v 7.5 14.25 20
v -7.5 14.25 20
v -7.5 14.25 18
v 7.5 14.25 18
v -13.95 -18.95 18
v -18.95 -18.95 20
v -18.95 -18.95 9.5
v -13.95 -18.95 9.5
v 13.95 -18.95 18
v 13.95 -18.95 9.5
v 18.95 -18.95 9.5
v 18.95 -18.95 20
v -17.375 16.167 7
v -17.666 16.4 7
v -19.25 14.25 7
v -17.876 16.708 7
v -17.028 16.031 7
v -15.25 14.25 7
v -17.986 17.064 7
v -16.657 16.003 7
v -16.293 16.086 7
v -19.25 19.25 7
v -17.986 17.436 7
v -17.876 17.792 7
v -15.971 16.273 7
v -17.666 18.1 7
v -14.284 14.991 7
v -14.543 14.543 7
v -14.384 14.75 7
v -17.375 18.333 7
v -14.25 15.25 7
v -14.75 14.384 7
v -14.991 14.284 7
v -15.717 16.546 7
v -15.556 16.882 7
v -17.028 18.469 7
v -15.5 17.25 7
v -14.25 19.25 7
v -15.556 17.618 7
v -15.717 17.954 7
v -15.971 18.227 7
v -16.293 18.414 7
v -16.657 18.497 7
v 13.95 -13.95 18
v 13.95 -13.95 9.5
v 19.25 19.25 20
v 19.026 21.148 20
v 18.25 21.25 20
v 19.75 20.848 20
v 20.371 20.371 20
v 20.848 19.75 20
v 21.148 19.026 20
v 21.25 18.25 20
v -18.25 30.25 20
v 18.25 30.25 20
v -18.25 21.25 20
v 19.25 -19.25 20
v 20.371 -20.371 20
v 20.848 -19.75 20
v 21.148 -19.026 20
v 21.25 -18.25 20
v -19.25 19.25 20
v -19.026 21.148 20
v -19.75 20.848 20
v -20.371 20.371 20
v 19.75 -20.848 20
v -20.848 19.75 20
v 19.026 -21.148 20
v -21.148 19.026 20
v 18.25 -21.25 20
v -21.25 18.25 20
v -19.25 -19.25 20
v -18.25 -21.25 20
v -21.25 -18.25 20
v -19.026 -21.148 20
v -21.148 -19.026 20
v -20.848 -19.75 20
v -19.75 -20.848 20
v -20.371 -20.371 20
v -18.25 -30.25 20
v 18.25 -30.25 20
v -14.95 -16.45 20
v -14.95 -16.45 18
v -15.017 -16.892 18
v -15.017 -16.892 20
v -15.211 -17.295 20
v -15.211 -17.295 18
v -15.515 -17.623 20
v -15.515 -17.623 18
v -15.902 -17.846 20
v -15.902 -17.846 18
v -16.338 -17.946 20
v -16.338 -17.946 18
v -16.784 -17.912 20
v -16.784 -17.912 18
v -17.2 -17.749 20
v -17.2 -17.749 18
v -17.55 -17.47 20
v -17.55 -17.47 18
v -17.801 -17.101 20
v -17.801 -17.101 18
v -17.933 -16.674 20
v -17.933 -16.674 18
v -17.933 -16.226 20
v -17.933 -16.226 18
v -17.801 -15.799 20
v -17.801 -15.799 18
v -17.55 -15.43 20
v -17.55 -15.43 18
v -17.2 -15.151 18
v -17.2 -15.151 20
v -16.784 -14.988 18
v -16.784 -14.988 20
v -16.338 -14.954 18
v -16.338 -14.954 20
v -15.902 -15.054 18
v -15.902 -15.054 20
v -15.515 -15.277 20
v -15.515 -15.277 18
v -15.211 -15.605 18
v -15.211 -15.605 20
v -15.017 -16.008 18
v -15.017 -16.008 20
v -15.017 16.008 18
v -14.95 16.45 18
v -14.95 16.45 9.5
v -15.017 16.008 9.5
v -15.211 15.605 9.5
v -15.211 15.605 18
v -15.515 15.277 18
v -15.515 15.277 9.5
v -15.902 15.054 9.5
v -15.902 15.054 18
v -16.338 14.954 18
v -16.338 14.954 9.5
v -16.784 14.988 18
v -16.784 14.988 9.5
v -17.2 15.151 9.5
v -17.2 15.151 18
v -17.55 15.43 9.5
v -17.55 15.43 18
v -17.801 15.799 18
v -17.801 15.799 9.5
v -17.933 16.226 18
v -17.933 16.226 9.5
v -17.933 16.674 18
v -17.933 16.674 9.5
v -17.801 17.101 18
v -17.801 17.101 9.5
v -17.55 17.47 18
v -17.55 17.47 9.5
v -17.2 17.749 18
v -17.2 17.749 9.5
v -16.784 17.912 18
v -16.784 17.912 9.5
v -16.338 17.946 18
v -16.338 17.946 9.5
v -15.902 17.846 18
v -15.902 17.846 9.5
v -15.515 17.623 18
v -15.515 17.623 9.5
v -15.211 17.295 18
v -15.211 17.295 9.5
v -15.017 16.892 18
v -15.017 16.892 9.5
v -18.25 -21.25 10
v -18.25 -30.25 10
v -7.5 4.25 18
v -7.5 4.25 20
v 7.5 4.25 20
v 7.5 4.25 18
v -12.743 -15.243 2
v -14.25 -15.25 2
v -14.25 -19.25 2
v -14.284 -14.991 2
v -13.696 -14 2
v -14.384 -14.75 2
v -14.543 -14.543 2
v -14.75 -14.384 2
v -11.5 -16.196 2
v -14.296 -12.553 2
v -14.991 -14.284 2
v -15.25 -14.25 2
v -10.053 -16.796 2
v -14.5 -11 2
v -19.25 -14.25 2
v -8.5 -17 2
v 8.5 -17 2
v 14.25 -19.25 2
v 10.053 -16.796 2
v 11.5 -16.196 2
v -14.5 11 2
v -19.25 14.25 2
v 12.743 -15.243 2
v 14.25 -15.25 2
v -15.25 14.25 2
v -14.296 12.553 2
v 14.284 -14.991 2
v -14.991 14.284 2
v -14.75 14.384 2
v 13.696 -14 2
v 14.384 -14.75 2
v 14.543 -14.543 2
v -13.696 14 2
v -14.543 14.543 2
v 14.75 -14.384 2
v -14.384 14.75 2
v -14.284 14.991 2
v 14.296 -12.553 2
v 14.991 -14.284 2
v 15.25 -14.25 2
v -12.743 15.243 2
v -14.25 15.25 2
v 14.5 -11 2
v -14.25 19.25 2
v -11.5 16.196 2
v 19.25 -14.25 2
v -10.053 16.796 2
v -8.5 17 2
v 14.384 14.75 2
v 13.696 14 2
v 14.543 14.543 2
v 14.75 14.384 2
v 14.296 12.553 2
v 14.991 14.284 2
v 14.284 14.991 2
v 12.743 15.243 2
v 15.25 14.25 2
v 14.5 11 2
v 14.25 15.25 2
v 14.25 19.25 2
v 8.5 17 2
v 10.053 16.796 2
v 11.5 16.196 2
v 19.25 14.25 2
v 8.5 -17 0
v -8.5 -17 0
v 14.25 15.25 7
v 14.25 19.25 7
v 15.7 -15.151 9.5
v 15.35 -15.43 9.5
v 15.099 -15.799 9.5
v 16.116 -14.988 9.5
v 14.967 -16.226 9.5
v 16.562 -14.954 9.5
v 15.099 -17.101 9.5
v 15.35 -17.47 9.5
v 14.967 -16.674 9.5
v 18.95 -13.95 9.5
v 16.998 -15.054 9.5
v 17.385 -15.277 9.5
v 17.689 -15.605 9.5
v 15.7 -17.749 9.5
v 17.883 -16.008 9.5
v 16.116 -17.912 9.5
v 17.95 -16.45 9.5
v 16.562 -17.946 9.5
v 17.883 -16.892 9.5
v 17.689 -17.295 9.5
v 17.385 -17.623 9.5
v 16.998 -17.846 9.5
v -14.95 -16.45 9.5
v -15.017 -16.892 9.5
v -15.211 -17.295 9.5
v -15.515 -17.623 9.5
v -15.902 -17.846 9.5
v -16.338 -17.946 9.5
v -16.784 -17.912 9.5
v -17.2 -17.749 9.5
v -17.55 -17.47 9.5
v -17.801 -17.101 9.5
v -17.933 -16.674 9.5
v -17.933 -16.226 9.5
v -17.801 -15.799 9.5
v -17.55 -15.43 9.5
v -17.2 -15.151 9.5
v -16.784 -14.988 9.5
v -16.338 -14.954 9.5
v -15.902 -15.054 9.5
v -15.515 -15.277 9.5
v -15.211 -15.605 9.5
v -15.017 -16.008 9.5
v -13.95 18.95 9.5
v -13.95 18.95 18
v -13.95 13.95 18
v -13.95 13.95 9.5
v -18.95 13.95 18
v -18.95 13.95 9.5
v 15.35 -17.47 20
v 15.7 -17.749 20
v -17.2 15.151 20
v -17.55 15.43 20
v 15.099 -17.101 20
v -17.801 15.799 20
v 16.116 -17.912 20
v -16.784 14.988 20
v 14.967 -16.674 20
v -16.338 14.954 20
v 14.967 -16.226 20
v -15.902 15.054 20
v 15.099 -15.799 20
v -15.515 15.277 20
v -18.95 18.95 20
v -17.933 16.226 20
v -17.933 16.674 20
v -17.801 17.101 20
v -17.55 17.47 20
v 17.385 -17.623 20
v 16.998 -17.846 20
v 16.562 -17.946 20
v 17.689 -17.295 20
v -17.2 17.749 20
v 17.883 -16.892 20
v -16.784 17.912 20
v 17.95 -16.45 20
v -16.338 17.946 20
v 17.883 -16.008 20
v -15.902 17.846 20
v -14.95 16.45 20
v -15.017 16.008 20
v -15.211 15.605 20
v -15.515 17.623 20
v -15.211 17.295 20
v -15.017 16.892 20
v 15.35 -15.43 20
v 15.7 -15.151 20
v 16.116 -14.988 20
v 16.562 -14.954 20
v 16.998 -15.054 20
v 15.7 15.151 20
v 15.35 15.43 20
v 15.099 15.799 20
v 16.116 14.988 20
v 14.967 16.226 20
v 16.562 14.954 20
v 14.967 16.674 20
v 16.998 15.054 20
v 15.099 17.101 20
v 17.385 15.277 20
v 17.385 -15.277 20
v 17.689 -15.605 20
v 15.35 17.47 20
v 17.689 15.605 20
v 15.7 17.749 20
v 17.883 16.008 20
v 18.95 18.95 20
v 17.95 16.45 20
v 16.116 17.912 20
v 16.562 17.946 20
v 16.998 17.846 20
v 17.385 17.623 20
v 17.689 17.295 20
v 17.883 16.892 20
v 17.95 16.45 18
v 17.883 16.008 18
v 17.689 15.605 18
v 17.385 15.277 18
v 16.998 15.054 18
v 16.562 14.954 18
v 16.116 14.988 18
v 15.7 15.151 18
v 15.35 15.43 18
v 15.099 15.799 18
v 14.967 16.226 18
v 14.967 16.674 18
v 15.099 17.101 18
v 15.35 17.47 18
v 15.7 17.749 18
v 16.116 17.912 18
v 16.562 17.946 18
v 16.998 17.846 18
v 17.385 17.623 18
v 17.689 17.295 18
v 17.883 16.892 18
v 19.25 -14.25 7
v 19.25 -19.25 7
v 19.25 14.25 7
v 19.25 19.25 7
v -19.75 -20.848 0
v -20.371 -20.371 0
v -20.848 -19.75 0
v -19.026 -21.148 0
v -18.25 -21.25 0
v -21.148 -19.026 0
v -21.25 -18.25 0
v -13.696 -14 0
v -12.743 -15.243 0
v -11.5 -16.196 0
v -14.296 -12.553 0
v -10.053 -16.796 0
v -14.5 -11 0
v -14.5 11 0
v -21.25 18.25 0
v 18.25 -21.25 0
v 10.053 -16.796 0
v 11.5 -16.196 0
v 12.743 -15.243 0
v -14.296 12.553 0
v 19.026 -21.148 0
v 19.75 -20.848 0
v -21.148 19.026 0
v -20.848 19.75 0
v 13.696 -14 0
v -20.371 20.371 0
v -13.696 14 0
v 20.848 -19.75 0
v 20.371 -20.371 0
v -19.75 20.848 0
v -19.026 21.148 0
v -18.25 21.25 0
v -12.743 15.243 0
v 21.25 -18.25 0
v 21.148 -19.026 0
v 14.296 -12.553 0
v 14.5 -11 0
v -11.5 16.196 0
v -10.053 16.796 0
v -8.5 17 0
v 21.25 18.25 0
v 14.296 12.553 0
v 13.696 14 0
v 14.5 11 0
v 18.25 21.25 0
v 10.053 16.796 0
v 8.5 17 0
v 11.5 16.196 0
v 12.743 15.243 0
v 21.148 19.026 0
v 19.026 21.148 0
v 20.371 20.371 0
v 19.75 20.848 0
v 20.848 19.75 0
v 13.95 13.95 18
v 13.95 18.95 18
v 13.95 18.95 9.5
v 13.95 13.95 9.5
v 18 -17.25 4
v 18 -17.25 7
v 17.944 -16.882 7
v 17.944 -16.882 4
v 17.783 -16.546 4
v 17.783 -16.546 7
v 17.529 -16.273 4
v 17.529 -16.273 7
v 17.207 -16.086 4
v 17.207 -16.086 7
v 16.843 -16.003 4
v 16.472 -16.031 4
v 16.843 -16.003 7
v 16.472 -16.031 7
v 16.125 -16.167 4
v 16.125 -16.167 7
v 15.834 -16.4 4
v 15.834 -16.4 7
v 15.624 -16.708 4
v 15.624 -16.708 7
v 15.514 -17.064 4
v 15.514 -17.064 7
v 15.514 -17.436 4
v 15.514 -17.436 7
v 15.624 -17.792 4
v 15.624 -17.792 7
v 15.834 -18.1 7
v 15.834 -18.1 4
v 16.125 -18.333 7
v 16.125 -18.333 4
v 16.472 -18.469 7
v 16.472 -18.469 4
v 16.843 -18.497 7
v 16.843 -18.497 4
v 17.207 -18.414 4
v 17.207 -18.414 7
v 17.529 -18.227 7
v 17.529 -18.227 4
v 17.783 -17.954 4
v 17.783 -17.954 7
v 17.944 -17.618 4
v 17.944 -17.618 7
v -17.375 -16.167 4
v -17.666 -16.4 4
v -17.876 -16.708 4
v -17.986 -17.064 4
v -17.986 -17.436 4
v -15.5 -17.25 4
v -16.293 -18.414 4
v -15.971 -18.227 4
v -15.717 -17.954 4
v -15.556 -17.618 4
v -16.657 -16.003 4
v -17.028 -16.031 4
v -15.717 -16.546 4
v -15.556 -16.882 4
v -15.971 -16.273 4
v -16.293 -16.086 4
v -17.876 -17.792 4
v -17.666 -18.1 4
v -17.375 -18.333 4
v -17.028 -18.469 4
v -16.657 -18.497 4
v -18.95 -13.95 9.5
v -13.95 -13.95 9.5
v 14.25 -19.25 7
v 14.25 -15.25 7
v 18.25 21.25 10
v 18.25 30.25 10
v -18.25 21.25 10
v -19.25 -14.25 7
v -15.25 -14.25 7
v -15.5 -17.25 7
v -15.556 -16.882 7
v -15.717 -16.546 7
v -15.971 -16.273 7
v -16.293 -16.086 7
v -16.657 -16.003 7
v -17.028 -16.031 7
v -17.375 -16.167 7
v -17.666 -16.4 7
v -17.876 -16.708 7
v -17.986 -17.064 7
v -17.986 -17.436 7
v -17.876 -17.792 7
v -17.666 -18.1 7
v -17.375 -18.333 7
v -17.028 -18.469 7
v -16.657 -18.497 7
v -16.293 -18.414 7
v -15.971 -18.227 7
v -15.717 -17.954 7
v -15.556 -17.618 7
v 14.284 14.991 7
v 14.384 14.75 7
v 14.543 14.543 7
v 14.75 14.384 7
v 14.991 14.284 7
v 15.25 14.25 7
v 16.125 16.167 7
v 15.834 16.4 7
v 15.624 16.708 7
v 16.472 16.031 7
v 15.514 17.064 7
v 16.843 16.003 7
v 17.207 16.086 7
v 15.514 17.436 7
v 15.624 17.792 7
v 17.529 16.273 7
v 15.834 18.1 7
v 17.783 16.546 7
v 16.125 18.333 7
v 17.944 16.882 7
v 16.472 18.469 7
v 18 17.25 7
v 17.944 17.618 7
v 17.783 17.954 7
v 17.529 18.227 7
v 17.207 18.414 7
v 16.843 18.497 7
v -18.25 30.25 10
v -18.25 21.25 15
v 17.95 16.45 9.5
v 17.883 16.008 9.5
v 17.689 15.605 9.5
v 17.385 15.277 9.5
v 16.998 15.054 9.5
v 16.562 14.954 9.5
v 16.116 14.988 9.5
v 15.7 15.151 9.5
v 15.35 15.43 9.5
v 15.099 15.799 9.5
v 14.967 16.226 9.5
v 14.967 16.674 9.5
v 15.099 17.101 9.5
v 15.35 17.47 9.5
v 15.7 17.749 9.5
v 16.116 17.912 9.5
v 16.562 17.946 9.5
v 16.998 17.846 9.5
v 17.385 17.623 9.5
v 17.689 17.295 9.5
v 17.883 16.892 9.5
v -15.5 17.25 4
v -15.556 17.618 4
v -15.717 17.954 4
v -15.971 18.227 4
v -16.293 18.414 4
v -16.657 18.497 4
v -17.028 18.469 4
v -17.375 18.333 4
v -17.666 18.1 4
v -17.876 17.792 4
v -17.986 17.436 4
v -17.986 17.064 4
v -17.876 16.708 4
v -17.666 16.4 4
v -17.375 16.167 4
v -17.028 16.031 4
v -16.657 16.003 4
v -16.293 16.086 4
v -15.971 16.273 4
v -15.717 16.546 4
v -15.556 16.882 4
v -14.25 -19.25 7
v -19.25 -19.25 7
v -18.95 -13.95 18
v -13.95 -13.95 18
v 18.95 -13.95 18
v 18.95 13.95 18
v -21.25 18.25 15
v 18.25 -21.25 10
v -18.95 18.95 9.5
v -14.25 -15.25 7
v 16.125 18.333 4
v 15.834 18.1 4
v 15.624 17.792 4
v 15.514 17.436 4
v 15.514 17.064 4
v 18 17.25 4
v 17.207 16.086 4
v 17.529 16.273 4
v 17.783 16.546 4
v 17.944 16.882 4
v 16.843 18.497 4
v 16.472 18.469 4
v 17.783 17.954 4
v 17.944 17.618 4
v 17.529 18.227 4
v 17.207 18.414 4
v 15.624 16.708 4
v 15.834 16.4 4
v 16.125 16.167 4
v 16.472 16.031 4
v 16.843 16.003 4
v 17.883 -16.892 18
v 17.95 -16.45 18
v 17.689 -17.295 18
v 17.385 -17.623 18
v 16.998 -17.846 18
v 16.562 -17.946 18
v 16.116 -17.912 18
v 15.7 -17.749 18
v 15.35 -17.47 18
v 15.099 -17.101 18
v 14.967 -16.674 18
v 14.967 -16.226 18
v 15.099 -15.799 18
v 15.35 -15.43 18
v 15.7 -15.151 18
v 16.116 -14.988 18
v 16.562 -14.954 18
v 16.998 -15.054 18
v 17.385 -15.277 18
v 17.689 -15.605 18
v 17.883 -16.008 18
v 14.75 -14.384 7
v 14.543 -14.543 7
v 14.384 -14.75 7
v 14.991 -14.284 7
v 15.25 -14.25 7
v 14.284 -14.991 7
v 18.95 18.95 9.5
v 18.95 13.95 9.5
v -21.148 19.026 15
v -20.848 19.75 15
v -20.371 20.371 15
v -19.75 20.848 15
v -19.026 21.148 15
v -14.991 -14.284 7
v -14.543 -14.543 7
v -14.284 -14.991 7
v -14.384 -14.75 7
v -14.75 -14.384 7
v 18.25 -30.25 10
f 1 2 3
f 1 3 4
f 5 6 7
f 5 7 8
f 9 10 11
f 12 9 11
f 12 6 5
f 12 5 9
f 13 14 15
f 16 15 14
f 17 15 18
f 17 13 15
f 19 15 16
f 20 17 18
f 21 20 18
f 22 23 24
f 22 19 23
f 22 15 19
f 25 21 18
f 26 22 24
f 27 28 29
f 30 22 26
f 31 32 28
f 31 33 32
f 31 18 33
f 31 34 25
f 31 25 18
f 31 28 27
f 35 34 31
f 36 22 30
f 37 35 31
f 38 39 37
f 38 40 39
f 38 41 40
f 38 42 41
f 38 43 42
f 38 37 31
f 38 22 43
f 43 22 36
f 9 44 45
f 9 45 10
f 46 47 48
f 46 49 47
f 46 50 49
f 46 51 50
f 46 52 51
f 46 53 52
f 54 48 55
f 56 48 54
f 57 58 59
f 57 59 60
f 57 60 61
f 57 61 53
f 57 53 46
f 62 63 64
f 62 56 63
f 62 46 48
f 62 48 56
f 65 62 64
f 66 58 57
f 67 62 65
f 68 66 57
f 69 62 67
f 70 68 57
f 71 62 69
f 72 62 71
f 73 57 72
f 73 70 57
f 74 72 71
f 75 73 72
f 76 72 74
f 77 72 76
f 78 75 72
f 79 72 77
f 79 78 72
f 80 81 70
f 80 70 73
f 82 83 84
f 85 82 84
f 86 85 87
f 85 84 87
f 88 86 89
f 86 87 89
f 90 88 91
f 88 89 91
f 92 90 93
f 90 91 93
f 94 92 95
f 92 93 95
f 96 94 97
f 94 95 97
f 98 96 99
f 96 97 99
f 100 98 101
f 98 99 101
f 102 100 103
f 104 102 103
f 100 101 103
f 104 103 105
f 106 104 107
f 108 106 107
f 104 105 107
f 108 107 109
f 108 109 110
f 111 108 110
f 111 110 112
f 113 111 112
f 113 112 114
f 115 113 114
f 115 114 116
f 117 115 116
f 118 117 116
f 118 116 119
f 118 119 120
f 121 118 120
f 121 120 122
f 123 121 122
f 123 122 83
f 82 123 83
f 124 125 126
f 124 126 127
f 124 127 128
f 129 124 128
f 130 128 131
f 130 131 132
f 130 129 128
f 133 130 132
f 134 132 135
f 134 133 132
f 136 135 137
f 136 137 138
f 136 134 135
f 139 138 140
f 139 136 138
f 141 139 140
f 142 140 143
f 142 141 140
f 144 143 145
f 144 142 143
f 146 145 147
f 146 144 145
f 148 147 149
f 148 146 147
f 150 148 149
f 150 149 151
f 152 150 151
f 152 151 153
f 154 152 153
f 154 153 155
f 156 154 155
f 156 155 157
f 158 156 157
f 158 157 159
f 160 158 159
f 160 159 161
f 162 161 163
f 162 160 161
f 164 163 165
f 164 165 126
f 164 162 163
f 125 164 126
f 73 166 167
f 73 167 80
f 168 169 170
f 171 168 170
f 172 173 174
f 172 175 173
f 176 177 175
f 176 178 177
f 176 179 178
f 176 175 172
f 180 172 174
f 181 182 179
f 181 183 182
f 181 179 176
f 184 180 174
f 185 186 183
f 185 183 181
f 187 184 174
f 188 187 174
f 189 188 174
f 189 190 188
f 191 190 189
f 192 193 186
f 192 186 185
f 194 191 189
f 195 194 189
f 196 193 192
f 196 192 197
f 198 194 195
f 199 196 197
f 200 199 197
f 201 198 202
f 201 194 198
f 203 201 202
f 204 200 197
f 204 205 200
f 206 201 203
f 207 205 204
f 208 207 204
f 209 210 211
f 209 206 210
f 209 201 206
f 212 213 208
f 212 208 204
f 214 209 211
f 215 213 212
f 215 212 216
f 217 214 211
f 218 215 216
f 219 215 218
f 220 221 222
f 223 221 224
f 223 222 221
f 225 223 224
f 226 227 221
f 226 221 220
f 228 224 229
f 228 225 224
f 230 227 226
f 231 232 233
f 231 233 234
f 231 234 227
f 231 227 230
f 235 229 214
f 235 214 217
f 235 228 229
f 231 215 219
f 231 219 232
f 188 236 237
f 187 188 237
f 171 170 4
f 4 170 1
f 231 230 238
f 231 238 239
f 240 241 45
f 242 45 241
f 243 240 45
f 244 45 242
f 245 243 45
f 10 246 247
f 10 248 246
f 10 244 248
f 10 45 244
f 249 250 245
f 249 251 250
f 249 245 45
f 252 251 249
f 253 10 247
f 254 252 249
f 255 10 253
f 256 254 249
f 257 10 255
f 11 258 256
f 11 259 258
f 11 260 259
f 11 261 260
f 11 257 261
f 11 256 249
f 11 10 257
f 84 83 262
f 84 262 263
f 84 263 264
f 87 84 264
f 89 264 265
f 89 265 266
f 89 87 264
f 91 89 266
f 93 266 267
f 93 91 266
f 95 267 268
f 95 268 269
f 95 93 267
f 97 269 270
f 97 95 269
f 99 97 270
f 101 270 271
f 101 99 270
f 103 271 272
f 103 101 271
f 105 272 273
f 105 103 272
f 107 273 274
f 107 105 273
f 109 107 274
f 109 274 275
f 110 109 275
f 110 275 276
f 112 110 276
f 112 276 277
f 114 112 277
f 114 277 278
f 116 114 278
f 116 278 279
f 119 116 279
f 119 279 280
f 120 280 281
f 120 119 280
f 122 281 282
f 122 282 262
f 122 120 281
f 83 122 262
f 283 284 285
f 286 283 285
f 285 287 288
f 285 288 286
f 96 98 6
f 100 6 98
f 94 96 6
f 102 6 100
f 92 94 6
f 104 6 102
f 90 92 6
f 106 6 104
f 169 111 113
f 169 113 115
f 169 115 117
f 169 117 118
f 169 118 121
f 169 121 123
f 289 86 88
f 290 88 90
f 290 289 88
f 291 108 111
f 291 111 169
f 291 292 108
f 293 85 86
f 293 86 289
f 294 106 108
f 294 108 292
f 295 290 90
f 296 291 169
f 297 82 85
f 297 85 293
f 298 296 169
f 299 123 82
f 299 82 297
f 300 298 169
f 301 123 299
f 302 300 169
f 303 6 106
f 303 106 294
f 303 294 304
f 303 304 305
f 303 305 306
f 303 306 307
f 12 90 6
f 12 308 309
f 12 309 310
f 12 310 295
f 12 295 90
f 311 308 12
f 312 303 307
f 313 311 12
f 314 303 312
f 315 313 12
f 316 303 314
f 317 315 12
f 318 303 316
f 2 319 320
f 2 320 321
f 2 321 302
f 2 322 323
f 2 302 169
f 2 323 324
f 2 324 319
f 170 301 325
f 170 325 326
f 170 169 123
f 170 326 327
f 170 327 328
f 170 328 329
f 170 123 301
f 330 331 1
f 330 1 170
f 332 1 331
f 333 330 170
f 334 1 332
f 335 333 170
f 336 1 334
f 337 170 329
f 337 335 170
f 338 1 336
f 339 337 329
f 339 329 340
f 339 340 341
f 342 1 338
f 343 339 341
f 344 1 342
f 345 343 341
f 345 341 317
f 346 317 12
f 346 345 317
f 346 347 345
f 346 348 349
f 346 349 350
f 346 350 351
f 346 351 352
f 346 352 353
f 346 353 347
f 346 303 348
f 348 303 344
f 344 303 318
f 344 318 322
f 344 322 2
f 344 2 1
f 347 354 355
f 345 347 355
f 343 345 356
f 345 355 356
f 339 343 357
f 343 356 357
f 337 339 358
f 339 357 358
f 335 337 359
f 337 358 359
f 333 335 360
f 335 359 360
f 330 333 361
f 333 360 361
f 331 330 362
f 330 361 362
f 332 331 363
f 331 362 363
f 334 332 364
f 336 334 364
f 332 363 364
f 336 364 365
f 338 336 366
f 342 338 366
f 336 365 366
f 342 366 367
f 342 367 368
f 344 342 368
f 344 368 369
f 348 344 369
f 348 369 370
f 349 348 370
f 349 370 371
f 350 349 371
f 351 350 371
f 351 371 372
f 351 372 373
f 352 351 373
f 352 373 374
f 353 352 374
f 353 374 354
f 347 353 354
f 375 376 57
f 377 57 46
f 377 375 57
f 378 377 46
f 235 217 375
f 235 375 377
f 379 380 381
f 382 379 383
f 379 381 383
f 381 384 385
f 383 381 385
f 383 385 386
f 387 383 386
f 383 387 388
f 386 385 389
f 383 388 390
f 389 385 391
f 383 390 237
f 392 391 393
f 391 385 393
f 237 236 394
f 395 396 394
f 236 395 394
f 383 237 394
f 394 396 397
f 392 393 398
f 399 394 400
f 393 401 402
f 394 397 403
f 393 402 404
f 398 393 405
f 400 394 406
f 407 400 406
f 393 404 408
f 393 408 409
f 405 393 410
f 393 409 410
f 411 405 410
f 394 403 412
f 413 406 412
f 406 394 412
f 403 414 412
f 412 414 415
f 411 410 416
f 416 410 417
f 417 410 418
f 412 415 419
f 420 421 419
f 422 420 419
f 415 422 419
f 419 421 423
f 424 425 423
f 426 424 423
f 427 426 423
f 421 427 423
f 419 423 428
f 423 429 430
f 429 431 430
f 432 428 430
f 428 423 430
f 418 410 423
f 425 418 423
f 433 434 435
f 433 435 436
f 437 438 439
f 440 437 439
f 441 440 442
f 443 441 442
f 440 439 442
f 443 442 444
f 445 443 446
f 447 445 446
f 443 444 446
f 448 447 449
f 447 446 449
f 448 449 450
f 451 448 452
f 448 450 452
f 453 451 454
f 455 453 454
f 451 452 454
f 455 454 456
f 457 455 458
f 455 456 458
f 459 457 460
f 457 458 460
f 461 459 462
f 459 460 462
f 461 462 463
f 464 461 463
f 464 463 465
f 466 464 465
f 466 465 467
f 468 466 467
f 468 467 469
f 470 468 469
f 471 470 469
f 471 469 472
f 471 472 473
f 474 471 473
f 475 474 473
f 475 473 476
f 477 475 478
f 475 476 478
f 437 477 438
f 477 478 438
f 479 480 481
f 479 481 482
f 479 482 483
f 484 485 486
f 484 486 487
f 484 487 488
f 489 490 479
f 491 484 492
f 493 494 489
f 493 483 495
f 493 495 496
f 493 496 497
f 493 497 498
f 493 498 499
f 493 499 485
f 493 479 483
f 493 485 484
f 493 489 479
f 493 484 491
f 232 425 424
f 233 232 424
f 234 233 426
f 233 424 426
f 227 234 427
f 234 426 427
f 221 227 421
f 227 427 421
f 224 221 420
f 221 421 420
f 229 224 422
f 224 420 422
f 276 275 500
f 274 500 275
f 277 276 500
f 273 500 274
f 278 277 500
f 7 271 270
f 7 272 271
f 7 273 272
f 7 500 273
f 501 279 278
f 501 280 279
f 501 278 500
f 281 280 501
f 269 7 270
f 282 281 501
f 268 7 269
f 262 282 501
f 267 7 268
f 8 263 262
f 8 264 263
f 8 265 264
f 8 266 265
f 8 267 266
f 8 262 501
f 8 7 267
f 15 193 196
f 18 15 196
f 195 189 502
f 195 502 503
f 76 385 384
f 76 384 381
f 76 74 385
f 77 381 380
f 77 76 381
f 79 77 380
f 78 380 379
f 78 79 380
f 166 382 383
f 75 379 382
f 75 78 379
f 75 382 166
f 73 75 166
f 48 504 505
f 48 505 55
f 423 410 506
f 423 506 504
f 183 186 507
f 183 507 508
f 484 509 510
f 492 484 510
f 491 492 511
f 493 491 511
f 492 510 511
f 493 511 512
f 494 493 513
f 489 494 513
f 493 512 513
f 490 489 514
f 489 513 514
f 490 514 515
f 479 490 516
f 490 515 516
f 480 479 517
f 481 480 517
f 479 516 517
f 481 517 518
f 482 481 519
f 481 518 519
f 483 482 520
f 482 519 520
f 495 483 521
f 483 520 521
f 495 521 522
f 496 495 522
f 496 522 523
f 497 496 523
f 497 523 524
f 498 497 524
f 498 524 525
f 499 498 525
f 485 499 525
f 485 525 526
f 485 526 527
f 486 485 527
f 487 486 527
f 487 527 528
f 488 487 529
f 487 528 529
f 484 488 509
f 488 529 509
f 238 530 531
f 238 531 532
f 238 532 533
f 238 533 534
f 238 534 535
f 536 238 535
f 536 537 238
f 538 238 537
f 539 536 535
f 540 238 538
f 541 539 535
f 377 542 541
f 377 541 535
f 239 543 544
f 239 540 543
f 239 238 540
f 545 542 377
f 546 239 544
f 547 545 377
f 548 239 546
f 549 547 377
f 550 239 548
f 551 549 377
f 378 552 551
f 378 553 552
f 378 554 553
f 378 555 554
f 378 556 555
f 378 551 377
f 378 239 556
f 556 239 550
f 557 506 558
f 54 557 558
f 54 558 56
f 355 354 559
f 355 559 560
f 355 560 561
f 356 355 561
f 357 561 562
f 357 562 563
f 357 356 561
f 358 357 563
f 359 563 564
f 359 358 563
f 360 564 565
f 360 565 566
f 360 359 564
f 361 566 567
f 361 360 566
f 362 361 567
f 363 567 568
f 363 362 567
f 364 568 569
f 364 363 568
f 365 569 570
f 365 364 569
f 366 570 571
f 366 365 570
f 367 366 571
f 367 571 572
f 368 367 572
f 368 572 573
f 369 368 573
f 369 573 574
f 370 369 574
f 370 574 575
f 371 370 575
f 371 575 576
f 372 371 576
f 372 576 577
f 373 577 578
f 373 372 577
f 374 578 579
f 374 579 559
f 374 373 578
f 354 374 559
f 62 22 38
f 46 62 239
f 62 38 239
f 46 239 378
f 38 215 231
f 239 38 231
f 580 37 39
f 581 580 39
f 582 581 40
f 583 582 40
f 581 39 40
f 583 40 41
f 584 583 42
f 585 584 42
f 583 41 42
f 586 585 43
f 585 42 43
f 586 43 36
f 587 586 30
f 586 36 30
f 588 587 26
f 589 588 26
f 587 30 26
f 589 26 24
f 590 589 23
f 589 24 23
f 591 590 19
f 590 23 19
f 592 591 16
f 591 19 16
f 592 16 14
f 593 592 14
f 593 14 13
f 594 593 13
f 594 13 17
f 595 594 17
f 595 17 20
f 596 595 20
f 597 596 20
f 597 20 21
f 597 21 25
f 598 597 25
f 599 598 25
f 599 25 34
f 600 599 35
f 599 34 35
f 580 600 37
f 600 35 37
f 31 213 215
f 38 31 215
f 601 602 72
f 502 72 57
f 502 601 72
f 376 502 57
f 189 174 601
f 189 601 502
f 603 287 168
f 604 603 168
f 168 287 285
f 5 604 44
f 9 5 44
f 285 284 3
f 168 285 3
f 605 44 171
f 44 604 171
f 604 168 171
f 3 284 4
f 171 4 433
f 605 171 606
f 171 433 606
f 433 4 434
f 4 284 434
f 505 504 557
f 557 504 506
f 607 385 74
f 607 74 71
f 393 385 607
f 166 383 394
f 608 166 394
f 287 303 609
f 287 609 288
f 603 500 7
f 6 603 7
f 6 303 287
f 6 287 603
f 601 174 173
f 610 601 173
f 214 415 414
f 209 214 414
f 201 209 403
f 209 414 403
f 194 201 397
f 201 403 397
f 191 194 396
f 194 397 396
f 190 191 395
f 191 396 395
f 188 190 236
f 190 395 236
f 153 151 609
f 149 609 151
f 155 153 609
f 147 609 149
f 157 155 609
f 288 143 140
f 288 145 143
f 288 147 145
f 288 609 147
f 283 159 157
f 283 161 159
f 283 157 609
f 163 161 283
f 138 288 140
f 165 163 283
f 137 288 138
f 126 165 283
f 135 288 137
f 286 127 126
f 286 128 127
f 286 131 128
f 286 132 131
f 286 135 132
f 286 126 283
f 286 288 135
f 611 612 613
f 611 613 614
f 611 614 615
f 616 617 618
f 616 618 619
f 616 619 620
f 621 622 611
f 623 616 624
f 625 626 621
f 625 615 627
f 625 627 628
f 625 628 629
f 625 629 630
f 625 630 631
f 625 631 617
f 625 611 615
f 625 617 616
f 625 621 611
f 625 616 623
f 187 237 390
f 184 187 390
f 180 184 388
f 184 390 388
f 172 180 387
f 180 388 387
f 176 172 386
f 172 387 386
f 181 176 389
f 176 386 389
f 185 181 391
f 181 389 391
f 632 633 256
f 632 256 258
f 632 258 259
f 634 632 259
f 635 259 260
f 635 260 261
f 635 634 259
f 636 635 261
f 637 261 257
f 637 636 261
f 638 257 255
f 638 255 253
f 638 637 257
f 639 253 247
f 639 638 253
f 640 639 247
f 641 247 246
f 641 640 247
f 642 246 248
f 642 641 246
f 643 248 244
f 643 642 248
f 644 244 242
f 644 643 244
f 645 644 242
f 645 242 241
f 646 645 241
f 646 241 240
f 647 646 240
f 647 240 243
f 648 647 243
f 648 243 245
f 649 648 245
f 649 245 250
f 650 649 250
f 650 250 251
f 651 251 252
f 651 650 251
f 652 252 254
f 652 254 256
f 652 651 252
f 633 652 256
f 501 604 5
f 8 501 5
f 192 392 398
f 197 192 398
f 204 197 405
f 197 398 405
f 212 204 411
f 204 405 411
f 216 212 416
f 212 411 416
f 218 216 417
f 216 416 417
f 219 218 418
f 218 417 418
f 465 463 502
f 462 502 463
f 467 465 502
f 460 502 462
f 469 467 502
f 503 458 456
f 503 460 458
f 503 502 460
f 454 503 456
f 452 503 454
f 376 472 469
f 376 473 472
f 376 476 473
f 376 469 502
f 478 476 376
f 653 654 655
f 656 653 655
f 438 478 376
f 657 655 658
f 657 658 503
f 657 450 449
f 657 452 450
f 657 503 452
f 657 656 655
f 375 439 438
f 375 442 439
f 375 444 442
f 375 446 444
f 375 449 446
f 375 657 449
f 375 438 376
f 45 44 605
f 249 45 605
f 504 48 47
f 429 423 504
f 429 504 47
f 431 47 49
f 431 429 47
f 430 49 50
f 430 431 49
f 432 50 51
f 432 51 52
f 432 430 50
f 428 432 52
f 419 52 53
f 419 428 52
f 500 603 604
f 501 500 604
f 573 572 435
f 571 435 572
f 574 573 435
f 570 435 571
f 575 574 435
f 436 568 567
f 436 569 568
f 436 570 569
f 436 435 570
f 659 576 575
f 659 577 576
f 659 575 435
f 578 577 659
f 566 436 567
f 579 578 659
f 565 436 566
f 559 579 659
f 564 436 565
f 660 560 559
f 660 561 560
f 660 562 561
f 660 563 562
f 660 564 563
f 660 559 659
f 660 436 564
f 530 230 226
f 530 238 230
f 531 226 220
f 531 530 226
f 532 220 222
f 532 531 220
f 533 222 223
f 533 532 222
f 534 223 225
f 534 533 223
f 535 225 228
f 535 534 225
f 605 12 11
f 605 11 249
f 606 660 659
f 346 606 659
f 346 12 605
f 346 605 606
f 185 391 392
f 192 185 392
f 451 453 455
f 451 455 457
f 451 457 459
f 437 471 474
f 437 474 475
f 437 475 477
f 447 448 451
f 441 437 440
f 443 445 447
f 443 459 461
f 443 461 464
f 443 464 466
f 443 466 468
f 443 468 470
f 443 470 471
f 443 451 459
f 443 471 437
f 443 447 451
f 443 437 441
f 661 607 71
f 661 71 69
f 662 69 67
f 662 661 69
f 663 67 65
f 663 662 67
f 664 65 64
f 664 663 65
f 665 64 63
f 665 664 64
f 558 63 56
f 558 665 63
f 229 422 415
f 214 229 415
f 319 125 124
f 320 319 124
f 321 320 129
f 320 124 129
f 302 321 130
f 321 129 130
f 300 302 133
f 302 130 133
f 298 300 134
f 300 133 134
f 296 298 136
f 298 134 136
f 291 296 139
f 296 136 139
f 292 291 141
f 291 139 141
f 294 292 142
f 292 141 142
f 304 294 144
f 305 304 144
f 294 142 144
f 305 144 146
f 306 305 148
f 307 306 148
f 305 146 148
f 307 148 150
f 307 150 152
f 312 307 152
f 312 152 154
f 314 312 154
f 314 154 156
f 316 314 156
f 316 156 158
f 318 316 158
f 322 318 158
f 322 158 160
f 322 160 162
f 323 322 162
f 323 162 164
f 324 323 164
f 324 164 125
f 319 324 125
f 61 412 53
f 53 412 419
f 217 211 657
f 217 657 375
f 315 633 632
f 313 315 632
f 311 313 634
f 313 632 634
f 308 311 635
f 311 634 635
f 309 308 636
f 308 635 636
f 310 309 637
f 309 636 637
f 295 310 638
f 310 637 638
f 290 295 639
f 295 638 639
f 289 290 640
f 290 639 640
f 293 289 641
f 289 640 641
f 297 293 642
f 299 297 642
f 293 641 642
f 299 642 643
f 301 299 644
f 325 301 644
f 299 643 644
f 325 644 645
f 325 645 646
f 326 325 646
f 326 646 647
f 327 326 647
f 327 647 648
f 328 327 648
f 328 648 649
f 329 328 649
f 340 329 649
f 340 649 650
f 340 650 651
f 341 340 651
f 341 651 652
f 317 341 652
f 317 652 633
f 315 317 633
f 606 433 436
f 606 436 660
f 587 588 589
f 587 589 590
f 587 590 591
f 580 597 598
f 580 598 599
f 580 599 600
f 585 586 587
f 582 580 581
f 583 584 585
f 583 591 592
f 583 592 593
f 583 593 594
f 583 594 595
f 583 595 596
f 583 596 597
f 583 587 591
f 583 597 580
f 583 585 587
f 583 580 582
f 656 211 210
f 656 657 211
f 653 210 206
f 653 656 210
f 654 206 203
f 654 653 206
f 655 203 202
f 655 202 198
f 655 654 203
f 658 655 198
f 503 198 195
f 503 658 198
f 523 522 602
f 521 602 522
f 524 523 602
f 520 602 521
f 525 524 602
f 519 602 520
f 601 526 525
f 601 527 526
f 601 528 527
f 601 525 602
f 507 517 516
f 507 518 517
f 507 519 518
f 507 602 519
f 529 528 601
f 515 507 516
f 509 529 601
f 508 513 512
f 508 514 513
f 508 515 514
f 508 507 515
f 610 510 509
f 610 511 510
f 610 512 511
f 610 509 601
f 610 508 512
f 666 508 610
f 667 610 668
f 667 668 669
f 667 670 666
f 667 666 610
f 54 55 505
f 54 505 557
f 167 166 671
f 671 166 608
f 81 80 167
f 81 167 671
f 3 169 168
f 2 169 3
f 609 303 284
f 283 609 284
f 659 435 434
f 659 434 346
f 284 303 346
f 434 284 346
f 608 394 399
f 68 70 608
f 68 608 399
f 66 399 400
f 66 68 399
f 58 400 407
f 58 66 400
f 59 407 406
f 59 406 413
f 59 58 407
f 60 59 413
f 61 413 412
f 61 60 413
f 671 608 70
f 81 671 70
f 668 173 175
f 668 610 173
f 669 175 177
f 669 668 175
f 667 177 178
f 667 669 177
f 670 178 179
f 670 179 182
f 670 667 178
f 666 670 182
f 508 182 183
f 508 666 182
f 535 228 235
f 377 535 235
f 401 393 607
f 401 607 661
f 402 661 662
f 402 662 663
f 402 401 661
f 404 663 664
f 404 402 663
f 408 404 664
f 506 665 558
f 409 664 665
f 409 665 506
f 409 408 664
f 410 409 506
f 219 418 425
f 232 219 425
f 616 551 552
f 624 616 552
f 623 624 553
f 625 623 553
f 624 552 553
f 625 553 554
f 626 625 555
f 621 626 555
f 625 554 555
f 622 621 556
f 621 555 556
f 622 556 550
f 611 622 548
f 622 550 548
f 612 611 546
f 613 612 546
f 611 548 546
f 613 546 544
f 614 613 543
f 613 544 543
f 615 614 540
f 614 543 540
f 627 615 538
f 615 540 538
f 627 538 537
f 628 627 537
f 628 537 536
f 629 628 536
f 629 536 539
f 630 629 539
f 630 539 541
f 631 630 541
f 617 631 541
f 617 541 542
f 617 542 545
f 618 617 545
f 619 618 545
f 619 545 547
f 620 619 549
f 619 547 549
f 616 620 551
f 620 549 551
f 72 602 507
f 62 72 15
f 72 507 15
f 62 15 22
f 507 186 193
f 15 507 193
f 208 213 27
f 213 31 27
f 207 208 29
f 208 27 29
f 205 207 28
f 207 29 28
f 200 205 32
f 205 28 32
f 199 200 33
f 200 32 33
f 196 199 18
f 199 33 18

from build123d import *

# Parameters (mm, degrees)
F0_W      = 42.5
F0_H      = 42.5
F0_W_2    = 38.5
F0_H_2    = 38.5
F1_DEPTH  = 2
F2_DEPTH  = 15
F3_W      = 5
F3_H      = 5
F4_DEPTH  = 5
F5_R      = 1
F6_R      = 3
F7_R      = 1.25
F8_DEPTH  = 3
F9_DEPTH  = 5
F10_W     = 37.9
F10_H     = 37.9
F10_W_2   = 15
F10_H_2   = 10
F11_DEPTH = 2
F12_W     = 5
F12_H     = 5
F12_R     = 1.5
F13_DEPTH = 8.5
F14_DEPTH = 25
F15_W     = 36.5
F15_H     = 10
F16_DEPTH = 9
F17_W     = 36.5
F17_H     = 10
F18_DEPTH = 9


with BuildPart() as f1:
    # F0 (on Top) → F1 (new body)
    with BuildSketch(Plane.XY):
        Rectangle(F0_W, F0_H)
        Rectangle(F0_W_2, F0_H_2, mode=Mode.SUBTRACT)
        Rectangle(F0_W_2, F0_H_2)
        with BuildLine():
            ThreePointArc((14.5, -11), (12.7426406871, -15.2426406871), (8.5, -17))
            Line((8.5, -17), (-8.5, -17))
            ThreePointArc((-8.5, -17), (-12.7426406871, -15.2426406871), (-14.5, -11))
            Line((-14.5, -11), (-14.5, 11))
            ThreePointArc((-14.5, 11), (-12.7426406871, 15.2426406871), (-8.5, 17))
            Line((-8.5, 17), (8.5, 17))
            ThreePointArc((8.5, 17), (12.7426406871, 15.2426406871), (14.5, 11))
            Line((14.5, 11), (14.5, -11))
        make_face(mode=Mode.SUBTRACT)
    extrude(amount=F1_DEPTH)

    # F0 (on Top) → F2 (join)
    with BuildSketch(Plane.XY):
        Rectangle(F0_W, F0_H)
        Rectangle(F0_W_2, F0_H_2, mode=Mode.SUBTRACT)
    extrude(amount=F2_DEPTH)

    # F3 (on face) → F4 (join)
    with BuildSketch(Plane.XY.offset(2)):
        with Locations((16.75, 16.75)):
            Rectangle(F3_W, F3_H)
        with Locations((16.75, -16.75)):
            Rectangle(F3_W, F3_H)
        with Locations((-16.75, -16.75)):
            Rectangle(F3_W, F3_H)
        with Locations((-16.75, 16.75)):
            Rectangle(F3_W, F3_H)
    extrude(amount=F4_DEPTH)

    # F5
    f5_edges = [f1.edges().sort_by_distance(p)[0] for p in [
        (14.25, 14.25, 4.5),
        (14.25, -14.25, 4.5),
        (-14.25, -14.25, 4.5),
        (-14.25, 14.25, 4.5),
    ]]
    fillet(f5_edges, radius=F5_R)

    # F6
    f6_edges = [f1.edges().sort_by_distance(p)[0] for p in [
        (21.25, 21.25, 7.5),
        (21.25, -21.25, 7.5),
        (-21.25, -21.25, 7.5),
        (-21.25, 21.25, 7.5),
    ]]
    fillet(f6_edges, radius=F6_R)

    # F7 (on face) → F8 (cut)
    with BuildSketch(Plane.XY.offset(7)):
        with Locations((16.75, -17.25)):
            Circle(F7_R)
        with Locations((-16.75, -17.25)):
            Circle(F7_R)
        with Locations((16.75, 17.25)):
            Circle(F7_R)
        with Locations((-16.75, 17.25)):
            Circle(F7_R)
    extrude(amount=-F8_DEPTH, mode=Mode.SUBTRACT)

    # F9 (add): a face of the model
    f9_faces = [f1.faces().sort_by_distance(p)[0] for p in [
        (-20.648959236, 0, 15),
    ]]
    extrude(f9_faces, amount=F9_DEPTH)

    # F15 (on face) → F16 (join)
    with BuildSketch(Plane.XZ.offset(21.25)):
        with Locations((0, 15)):
            Rectangle(F15_W, F15_H)
    extrude(amount=F16_DEPTH)

    # F17 (on face) → F18 (join)
    with BuildSketch(Plane(origin=(0, 21.25, 0), x_dir=(-1, 0, 0), z_dir=(0, 1, 0))):
        with Locations((0, 15)):
            Rectangle(F17_W, F17_H)
    extrude(amount=F18_DEPTH)


with BuildPart() as f11:
    # F10 (on face) → F11 (new body)
    with BuildSketch(Plane.XY.offset(20)):
        Rectangle(F10_W, F10_H)
        with Locations((0, 9.25)):
            Rectangle(F10_W_2, F10_H_2, mode=Mode.SUBTRACT)
    extrude(amount=-F11_DEPTH)

    # F12 (on face) → F13 (join)
    with BuildSketch(Plane(origin=(0, 0, 18), x_dir=(1, 0, 0), z_dir=(0, 0, -1))):
        with Locations((-16.45, 16.45)):
            Rectangle(F12_W, F12_H)
        with Locations((-16.45, 16.45)):
            Circle(F12_R, mode=Mode.SUBTRACT)
        with Locations((16.45, 16.45)):
            Rectangle(F12_W, F12_H)
        with Locations((16.45, 16.45)):
            Circle(F12_R, mode=Mode.SUBTRACT)
        with Locations((-16.45, -16.45)):
            Rectangle(F12_W, F12_H)
        with Locations((-16.45, -16.45)):
            Circle(F12_R, mode=Mode.SUBTRACT)
        with Locations((16.45, -16.45)):
            Rectangle(F12_W, F12_H)
        with Locations((16.45, -16.45)):
            Circle(F12_R, mode=Mode.SUBTRACT)
    extrude(amount=F13_DEPTH)

    # F14 (cut): faces of the model
    f14_faces = [f11.faces().sort_by_distance(p)[0] for p in [
        (-16.45, -16.45, 18),
        (16.45, -16.45, 18),
        (16.45, 16.45, 18),
        (-16.45, 16.45, 18),
    ]]
    extrude(f14_faces, amount=-F14_DEPTH, mode=Mode.SUBTRACT)


solid = Compound([f1.part, f11.part])
